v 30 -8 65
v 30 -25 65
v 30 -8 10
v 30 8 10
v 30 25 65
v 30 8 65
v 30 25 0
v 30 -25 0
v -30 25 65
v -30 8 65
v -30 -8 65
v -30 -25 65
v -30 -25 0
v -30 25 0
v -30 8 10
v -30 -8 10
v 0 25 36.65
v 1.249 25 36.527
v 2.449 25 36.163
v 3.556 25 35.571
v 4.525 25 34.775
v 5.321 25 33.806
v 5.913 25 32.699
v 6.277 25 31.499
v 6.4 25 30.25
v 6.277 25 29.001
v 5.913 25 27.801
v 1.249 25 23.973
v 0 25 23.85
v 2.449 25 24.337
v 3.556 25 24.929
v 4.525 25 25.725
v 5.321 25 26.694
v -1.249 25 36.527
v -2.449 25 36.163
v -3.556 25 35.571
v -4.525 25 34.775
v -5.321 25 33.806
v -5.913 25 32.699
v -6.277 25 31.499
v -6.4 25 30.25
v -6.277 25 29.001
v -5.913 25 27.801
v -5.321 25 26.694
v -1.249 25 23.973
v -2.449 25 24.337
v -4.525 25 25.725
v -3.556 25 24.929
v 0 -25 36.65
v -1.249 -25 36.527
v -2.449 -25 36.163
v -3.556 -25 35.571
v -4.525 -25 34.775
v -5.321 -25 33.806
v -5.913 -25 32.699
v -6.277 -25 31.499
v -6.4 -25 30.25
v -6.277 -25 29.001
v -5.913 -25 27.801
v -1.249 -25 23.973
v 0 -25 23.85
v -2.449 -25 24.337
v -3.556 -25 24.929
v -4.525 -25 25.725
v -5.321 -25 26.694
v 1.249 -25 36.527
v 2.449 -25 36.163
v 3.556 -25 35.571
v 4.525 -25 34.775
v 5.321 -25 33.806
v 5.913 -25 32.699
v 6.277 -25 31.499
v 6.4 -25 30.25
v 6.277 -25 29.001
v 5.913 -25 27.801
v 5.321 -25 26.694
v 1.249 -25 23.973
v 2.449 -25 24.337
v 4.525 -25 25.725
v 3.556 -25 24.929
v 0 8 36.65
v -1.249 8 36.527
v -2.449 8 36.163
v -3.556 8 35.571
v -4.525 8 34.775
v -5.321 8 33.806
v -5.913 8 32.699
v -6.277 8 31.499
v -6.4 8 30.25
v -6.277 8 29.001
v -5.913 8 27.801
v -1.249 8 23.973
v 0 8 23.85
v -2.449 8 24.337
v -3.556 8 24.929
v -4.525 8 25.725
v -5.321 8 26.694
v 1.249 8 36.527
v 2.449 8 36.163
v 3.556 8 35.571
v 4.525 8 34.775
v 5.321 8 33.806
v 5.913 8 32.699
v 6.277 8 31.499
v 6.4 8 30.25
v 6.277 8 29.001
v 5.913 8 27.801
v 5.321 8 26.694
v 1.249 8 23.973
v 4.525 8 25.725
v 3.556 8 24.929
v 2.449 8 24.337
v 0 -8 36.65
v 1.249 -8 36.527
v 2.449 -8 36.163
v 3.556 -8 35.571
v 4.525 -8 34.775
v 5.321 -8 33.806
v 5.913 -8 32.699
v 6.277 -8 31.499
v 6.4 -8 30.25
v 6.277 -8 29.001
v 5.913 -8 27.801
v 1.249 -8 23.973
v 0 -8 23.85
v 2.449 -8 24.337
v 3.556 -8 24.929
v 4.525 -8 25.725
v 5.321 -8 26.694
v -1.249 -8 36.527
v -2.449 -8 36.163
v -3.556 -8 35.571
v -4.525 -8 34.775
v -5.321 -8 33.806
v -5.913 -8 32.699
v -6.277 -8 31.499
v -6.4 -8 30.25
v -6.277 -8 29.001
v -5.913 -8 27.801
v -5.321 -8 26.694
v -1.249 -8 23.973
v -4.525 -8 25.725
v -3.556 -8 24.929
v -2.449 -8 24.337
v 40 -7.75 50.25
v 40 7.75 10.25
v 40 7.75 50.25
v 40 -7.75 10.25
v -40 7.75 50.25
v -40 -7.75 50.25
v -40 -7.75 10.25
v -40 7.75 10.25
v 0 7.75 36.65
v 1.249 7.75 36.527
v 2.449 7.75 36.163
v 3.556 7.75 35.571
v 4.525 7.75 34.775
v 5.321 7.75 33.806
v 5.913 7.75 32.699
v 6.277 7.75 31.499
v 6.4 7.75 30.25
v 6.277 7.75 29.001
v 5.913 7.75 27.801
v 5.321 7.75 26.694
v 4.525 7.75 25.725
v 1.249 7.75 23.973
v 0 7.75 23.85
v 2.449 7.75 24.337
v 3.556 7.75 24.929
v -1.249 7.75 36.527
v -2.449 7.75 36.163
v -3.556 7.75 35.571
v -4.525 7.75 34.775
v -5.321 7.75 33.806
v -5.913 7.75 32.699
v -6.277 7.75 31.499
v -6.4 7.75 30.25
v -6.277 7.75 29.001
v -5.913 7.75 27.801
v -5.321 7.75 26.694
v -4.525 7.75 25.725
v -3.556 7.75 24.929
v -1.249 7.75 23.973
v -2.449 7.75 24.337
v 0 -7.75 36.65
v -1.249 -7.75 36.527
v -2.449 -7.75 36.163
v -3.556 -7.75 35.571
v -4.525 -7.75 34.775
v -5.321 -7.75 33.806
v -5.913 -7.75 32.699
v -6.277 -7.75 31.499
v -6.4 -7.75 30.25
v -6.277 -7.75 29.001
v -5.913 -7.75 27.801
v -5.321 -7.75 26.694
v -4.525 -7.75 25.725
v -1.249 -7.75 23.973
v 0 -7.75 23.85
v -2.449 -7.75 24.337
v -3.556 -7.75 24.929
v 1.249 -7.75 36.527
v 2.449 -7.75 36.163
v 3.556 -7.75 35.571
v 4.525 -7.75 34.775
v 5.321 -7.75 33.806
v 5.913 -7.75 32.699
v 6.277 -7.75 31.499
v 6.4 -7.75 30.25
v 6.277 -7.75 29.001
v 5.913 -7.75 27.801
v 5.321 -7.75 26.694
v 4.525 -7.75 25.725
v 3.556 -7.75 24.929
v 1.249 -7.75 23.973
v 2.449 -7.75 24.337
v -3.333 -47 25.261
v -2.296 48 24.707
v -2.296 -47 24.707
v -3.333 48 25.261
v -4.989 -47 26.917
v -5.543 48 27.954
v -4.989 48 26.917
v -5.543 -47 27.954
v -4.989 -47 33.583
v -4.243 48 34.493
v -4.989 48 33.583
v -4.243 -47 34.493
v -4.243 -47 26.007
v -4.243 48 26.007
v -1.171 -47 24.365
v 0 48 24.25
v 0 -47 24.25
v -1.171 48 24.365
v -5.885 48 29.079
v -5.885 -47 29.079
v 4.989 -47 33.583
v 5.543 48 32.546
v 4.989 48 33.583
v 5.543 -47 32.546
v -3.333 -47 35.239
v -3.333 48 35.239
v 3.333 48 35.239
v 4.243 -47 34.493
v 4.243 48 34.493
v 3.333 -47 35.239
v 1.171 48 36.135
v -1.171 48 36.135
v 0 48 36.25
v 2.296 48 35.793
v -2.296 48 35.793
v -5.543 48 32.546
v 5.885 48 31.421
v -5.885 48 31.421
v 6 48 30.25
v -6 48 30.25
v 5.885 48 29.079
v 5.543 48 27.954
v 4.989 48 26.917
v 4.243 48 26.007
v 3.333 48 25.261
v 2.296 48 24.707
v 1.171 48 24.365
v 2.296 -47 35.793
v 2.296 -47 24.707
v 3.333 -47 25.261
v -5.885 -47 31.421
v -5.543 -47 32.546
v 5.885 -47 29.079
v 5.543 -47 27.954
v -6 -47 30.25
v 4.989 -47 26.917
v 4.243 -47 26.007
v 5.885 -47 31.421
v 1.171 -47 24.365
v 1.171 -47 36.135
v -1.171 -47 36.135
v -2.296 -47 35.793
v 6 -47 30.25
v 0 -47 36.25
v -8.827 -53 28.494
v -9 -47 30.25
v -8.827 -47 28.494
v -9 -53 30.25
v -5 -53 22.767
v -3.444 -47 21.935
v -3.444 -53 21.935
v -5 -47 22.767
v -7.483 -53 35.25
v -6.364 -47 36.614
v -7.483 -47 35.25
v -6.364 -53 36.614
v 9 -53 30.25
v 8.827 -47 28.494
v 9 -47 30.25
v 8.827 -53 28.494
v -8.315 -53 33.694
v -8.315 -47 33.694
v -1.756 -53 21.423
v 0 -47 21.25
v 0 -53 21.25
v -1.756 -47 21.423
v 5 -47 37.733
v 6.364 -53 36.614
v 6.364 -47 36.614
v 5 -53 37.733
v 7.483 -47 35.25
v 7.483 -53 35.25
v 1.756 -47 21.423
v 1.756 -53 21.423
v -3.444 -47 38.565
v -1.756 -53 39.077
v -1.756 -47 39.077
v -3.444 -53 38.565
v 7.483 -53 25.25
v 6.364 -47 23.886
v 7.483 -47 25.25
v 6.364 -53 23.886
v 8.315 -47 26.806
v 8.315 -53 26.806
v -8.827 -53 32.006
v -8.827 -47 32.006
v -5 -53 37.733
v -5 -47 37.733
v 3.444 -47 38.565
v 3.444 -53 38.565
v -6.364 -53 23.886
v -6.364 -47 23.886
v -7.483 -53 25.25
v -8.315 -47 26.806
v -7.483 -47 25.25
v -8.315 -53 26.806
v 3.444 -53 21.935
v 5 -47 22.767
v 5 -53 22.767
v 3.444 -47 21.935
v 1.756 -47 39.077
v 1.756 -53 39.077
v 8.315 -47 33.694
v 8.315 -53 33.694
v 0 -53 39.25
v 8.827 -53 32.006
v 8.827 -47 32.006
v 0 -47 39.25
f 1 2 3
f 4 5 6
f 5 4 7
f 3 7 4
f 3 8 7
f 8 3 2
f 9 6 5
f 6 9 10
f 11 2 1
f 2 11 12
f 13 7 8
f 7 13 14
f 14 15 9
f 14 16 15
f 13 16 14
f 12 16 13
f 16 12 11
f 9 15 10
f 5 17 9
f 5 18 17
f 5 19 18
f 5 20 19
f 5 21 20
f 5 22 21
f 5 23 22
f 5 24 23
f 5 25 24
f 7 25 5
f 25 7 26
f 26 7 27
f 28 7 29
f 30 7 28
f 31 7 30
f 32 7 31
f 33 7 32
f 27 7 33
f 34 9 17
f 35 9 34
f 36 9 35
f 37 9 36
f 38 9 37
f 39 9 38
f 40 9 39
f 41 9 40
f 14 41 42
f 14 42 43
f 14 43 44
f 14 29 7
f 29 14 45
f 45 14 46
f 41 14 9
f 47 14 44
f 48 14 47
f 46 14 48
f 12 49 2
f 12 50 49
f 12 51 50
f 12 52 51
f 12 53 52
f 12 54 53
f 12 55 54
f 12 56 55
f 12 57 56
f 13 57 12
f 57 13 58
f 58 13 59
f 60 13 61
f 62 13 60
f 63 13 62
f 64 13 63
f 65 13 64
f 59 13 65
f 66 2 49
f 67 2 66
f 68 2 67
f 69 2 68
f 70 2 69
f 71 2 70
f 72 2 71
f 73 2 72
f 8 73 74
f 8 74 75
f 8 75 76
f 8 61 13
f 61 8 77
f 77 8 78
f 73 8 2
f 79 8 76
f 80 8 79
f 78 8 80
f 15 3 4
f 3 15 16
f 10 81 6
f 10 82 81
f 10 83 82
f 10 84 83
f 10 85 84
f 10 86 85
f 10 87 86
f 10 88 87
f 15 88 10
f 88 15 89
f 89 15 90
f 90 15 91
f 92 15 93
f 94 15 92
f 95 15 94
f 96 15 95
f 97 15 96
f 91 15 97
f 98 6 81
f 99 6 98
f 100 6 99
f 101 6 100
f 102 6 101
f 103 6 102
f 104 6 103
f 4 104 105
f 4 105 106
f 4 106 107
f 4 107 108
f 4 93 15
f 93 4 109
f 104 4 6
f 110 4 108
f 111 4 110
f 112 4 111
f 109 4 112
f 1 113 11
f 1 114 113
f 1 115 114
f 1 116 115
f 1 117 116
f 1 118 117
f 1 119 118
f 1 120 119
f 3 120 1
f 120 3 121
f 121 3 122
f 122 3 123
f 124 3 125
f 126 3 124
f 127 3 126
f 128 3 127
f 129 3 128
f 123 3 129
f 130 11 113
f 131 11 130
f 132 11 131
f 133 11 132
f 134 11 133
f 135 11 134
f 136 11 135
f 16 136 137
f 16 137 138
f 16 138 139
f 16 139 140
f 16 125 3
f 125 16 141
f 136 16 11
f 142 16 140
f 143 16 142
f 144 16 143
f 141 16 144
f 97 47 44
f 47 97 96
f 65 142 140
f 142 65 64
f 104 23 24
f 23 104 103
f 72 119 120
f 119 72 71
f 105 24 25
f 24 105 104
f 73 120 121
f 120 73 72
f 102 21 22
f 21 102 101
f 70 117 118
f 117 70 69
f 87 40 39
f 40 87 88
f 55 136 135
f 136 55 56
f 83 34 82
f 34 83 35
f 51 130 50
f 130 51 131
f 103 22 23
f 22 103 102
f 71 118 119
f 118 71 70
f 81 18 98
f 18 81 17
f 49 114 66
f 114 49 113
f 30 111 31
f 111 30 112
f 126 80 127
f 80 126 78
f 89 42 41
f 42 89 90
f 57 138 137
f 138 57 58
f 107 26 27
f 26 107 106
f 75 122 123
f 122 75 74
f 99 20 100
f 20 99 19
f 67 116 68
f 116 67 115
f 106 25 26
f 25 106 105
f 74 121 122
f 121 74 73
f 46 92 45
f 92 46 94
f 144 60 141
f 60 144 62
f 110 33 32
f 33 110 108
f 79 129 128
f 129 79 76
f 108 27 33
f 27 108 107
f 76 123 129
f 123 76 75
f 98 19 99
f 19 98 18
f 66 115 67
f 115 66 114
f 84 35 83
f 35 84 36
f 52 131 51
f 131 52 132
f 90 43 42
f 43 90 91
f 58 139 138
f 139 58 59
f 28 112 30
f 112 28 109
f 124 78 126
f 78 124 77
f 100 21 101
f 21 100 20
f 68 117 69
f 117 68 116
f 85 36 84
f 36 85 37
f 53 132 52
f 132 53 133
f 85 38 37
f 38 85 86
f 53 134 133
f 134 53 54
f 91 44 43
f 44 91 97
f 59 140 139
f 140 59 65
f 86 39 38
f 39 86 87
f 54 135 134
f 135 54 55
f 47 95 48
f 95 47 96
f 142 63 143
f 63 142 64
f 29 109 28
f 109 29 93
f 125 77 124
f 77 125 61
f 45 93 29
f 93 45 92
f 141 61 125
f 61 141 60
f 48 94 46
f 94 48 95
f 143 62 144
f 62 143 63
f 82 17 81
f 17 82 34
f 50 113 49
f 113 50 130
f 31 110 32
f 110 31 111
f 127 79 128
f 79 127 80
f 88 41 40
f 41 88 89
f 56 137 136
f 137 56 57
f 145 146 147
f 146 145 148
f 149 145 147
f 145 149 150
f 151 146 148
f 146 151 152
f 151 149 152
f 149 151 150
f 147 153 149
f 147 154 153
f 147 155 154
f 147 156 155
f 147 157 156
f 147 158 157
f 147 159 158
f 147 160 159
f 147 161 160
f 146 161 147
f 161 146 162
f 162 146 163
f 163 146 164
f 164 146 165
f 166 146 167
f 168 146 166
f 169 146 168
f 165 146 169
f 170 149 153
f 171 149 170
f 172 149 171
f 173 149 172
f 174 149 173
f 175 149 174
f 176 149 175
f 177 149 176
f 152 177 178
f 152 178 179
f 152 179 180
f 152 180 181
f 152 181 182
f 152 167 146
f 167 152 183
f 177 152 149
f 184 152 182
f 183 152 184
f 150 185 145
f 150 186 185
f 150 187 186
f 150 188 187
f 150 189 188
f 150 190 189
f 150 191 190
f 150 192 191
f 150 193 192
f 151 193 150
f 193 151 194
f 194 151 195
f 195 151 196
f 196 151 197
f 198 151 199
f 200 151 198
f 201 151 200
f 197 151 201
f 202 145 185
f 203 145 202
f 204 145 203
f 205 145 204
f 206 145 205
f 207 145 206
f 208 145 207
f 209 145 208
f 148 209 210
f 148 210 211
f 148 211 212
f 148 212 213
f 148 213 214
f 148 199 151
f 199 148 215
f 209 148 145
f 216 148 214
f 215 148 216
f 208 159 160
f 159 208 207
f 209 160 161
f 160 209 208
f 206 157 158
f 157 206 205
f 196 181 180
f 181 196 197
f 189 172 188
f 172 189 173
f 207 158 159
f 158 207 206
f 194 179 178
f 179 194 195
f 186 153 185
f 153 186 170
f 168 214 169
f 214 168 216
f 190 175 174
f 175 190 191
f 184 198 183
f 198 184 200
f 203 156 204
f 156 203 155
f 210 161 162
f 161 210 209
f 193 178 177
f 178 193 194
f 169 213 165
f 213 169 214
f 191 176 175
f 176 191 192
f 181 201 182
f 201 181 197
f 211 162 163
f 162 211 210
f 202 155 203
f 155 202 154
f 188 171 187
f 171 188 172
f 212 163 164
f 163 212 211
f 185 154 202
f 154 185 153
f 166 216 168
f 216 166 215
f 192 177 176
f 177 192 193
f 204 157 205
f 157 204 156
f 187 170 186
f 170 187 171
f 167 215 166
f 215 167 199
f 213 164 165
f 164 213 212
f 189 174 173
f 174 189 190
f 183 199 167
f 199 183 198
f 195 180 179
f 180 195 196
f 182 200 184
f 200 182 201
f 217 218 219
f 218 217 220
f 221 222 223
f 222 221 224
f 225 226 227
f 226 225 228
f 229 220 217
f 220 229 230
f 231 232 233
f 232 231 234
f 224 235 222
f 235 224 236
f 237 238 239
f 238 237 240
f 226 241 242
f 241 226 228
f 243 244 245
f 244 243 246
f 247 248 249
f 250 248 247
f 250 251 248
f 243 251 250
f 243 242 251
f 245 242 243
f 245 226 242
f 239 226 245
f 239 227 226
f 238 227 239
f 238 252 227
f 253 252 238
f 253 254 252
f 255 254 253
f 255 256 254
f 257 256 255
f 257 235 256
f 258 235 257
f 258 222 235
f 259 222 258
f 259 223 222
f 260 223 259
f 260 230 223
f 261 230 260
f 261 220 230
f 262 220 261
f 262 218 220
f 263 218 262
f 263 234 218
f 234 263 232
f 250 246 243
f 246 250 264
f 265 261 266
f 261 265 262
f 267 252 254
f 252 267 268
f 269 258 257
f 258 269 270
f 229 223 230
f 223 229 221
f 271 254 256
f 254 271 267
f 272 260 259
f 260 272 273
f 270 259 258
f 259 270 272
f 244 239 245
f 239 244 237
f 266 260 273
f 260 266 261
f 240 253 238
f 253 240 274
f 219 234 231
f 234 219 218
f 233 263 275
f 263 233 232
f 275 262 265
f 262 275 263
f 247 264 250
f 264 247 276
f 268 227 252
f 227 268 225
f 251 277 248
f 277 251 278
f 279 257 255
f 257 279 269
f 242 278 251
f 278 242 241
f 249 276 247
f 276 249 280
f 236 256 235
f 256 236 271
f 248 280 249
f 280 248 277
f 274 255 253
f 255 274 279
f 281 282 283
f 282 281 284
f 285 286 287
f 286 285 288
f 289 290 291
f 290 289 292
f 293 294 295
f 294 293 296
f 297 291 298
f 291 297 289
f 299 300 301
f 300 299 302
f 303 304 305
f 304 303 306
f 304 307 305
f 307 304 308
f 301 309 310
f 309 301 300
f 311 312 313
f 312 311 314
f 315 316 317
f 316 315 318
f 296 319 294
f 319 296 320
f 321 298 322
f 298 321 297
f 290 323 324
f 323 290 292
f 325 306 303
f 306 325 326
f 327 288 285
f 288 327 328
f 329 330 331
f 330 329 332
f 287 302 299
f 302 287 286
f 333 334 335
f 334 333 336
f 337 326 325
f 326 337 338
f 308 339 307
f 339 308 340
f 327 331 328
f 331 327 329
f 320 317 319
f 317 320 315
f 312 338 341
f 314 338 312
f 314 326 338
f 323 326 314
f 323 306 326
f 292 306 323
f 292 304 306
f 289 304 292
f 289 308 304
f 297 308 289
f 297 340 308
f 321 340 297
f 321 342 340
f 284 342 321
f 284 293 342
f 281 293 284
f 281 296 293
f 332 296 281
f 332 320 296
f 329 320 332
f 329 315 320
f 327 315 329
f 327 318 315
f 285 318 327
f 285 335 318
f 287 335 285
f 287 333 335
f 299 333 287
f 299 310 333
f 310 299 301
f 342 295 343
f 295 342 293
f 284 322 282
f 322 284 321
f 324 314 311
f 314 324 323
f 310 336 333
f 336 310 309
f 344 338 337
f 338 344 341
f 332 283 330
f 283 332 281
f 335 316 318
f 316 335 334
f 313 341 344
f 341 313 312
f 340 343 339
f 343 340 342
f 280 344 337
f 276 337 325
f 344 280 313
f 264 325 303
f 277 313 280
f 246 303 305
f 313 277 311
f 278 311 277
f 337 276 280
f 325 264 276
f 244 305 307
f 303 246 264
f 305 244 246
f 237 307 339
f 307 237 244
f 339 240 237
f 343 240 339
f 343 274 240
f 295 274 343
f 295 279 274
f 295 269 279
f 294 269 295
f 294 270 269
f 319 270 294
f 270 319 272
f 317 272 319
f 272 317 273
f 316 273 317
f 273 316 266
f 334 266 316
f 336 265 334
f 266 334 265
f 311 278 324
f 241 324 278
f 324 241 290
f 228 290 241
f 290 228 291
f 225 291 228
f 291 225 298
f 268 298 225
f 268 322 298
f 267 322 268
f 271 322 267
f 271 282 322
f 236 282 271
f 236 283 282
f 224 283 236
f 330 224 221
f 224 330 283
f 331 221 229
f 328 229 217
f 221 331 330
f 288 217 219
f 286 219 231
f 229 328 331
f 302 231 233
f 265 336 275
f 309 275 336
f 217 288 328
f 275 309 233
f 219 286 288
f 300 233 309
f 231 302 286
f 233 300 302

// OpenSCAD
$fn = 32;

// ------------------------------------------------------------------------
// Clevis joint: 60 mm clevis, pin d12
// Every part is its own module, assembly() places them once.
// ------------------------------------------------------------------------

// --- part 1 ---
module clevis() {
  difference() {
    translate([-30, -25, 0]) cube([60, 50, 65]);
    translate([-31, -8, 10]) cube([62, 16, 56]);
    translate([0, 0, 30.25]) rotate([90, 0, 0]) cylinder(h = 52, d = 12.8, center = true);
  }
}

// --- part 2 ---
module eye() {
  difference() {
    translate([-40, -7.75, 0]) cube([80, 15.5, 40]);
    translate([0, 0, 20]) rotate([90, 0, 0]) cylinder(h = 17.5, d = 12.8, center = true);
  }
}

// --- part 3 ---
module pin() {
  rotate([0, 90, 0]) cylinder(h = 96, d = 12, center = true);
  translate([-53, 0, 0]) rotate([0, 90, 0]) cylinder(h = 6, d = 18);
}

// --- assembly ---
module assembly() {
  translate([0, 0, 0]) rotate([0, 0, 0]) clevis();
  translate([0, 0, 10.25]) rotate([0, 0, 0]) eye();
  translate([0, 0, 30.25]) rotate([0, 0, 90]) pin();
}

assembly();
